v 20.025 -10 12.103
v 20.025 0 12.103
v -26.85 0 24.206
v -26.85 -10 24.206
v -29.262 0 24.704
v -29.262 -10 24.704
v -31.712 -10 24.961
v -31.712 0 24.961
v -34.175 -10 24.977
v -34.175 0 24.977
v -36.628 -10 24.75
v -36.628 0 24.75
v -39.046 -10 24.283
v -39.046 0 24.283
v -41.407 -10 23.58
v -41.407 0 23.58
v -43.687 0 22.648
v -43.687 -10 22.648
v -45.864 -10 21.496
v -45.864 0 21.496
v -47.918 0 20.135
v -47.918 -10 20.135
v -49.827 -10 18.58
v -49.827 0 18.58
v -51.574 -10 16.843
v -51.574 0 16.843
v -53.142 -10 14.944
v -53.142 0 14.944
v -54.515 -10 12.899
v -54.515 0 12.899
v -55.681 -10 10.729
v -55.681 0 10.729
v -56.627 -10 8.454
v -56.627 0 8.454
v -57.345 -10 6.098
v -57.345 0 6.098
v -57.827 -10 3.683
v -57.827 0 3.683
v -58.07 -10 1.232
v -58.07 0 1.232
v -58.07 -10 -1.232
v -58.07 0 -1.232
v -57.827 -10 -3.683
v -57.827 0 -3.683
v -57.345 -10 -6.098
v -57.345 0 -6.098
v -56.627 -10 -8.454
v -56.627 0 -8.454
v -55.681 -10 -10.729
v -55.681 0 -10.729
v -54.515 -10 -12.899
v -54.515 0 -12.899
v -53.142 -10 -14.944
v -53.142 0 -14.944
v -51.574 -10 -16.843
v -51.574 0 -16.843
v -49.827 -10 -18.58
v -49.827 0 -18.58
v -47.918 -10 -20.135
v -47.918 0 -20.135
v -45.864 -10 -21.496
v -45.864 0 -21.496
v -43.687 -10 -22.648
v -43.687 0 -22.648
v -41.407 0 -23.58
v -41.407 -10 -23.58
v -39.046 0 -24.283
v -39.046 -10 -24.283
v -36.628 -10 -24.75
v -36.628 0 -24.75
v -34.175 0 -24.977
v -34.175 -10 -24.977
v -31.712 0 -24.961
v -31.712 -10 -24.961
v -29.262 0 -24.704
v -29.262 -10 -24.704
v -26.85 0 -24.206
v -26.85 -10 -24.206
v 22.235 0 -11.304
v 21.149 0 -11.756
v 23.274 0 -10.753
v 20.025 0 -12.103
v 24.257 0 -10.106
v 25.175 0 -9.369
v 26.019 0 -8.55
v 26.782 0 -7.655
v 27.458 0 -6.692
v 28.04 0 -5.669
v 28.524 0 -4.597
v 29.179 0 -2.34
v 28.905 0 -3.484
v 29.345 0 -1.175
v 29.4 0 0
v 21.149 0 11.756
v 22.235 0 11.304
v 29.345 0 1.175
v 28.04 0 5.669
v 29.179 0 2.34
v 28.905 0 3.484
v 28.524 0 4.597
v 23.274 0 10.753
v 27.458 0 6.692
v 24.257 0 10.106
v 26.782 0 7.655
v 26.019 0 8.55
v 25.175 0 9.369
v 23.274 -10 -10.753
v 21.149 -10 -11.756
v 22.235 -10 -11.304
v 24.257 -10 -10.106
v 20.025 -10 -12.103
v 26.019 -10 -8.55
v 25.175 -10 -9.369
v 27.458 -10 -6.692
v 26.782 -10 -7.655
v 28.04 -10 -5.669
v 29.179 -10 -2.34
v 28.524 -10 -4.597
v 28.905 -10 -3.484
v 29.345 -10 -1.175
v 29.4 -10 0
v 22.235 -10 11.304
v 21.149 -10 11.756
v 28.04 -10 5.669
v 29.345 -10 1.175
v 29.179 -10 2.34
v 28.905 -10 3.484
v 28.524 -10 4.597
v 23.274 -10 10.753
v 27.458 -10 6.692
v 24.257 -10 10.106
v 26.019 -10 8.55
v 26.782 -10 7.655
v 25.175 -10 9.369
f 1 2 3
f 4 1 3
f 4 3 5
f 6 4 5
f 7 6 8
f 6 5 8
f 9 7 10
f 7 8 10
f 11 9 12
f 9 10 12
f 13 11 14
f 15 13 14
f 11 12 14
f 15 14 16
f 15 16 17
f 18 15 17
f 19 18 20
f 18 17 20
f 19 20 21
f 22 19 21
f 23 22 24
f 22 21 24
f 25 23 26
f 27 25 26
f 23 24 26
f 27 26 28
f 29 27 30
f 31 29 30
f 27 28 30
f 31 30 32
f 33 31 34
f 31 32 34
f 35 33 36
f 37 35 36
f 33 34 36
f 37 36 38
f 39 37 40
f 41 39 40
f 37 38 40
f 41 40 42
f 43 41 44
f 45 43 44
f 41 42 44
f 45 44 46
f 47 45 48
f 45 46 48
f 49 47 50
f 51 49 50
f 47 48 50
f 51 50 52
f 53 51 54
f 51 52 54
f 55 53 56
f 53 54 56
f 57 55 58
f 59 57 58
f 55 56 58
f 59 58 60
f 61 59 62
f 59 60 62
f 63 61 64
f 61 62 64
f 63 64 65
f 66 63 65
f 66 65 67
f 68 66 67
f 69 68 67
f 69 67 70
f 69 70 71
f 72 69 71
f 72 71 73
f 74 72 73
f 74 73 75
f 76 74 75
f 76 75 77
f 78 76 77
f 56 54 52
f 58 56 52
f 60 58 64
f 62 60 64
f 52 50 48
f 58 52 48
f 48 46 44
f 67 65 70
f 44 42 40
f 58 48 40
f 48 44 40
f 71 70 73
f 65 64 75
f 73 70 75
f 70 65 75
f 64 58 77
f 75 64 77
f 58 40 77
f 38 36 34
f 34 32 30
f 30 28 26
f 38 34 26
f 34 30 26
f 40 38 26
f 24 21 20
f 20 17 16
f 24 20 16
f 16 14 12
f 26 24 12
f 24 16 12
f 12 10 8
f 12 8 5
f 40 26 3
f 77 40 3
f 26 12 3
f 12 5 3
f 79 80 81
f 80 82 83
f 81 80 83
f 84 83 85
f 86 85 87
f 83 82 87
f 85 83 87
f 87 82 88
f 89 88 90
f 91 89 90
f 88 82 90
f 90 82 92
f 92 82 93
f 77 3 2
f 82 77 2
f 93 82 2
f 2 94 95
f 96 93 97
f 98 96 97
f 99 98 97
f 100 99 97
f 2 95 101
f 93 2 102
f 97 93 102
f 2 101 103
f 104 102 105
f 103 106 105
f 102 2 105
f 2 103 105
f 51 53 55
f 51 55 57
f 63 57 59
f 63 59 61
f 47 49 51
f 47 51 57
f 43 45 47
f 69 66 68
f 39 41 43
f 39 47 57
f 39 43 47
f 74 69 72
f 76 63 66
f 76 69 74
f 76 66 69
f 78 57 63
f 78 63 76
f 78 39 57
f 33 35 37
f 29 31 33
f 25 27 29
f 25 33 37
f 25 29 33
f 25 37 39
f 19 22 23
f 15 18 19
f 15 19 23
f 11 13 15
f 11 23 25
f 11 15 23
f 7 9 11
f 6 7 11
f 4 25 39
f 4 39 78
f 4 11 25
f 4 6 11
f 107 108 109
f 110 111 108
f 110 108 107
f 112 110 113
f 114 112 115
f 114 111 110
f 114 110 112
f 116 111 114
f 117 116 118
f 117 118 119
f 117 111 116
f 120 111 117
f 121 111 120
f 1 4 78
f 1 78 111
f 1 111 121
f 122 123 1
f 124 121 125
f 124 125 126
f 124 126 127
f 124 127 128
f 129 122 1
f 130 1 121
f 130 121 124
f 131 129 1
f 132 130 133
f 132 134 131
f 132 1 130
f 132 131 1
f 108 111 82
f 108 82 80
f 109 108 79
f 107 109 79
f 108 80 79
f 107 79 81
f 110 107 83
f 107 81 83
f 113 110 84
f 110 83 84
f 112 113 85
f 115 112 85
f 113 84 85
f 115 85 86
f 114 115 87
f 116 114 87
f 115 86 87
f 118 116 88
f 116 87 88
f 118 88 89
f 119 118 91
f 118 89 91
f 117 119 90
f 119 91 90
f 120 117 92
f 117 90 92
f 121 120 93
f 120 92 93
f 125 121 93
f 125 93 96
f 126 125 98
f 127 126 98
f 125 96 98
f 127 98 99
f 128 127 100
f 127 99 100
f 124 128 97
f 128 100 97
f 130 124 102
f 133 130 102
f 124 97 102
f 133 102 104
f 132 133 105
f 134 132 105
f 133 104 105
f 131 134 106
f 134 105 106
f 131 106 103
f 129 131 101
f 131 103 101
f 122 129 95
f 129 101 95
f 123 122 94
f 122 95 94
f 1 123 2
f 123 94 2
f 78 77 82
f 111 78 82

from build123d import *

# Parameters (mm, degrees)
F1_DEPTH = 10


# Not quite as in the source:
# - the program builds the solid bodies; features that only make, move or delete a surface that nothing else refers to are left out


with BuildPart() as f1:
    # F0 (on Front) → F1 (new body)
    with BuildSketch(Plane.XZ):
        with BuildLine():
            ThreePointArc((-8.1000001146, 0), (-13.3357647385, 15.3093108924), (-26.8500001146, 24.2061459138))
            ThreePointArc((-26.8500001146, 24.2061459138), (-58.1000001146, 0), (-26.8500001146, -24.2061459138))
            ThreePointArc((-26.8500001146, -24.2061459138), (-13.3357647385, -15.3093108924), (-8.1000001146, 0))
        make_face()
        with BuildLine():
            Line((20.0249998854, 12.1030729569), (-26.8500001146, 24.2061459138))
            ThreePointArc((-26.8500001146, 24.2061459138), (-13.3357647385, 15.3093108924), (-8.1000001146, 0))
            ThreePointArc((-8.1000001146, 0), (-13.3357647385, -15.3093108924), (-26.8500001146, -24.2061459138))
            Line((-26.8500001146, -24.2061459138), (20.0249998854, -12.1030729569))
            ThreePointArc((20.0249998854, -12.1030729569), (4.3999998854, 0), (20.0249998854, 12.1030729569))
        make_face()
        with BuildLine():
            ThreePointArc((29.3999998854, 0), (26.7821175735, 7.6546554462), (20.0249998854, 12.1030729569))
            ThreePointArc((20.0249998854, 12.1030729569), (4.3999998854, 0), (20.0249998854, -12.1030729569))
            ThreePointArc((20.0249998854, -12.1030729569), (26.7821175735, -7.6546554462), (29.3999998854, 0))
        make_face()
    extrude(amount=F1_DEPTH)


solid = f1.part
